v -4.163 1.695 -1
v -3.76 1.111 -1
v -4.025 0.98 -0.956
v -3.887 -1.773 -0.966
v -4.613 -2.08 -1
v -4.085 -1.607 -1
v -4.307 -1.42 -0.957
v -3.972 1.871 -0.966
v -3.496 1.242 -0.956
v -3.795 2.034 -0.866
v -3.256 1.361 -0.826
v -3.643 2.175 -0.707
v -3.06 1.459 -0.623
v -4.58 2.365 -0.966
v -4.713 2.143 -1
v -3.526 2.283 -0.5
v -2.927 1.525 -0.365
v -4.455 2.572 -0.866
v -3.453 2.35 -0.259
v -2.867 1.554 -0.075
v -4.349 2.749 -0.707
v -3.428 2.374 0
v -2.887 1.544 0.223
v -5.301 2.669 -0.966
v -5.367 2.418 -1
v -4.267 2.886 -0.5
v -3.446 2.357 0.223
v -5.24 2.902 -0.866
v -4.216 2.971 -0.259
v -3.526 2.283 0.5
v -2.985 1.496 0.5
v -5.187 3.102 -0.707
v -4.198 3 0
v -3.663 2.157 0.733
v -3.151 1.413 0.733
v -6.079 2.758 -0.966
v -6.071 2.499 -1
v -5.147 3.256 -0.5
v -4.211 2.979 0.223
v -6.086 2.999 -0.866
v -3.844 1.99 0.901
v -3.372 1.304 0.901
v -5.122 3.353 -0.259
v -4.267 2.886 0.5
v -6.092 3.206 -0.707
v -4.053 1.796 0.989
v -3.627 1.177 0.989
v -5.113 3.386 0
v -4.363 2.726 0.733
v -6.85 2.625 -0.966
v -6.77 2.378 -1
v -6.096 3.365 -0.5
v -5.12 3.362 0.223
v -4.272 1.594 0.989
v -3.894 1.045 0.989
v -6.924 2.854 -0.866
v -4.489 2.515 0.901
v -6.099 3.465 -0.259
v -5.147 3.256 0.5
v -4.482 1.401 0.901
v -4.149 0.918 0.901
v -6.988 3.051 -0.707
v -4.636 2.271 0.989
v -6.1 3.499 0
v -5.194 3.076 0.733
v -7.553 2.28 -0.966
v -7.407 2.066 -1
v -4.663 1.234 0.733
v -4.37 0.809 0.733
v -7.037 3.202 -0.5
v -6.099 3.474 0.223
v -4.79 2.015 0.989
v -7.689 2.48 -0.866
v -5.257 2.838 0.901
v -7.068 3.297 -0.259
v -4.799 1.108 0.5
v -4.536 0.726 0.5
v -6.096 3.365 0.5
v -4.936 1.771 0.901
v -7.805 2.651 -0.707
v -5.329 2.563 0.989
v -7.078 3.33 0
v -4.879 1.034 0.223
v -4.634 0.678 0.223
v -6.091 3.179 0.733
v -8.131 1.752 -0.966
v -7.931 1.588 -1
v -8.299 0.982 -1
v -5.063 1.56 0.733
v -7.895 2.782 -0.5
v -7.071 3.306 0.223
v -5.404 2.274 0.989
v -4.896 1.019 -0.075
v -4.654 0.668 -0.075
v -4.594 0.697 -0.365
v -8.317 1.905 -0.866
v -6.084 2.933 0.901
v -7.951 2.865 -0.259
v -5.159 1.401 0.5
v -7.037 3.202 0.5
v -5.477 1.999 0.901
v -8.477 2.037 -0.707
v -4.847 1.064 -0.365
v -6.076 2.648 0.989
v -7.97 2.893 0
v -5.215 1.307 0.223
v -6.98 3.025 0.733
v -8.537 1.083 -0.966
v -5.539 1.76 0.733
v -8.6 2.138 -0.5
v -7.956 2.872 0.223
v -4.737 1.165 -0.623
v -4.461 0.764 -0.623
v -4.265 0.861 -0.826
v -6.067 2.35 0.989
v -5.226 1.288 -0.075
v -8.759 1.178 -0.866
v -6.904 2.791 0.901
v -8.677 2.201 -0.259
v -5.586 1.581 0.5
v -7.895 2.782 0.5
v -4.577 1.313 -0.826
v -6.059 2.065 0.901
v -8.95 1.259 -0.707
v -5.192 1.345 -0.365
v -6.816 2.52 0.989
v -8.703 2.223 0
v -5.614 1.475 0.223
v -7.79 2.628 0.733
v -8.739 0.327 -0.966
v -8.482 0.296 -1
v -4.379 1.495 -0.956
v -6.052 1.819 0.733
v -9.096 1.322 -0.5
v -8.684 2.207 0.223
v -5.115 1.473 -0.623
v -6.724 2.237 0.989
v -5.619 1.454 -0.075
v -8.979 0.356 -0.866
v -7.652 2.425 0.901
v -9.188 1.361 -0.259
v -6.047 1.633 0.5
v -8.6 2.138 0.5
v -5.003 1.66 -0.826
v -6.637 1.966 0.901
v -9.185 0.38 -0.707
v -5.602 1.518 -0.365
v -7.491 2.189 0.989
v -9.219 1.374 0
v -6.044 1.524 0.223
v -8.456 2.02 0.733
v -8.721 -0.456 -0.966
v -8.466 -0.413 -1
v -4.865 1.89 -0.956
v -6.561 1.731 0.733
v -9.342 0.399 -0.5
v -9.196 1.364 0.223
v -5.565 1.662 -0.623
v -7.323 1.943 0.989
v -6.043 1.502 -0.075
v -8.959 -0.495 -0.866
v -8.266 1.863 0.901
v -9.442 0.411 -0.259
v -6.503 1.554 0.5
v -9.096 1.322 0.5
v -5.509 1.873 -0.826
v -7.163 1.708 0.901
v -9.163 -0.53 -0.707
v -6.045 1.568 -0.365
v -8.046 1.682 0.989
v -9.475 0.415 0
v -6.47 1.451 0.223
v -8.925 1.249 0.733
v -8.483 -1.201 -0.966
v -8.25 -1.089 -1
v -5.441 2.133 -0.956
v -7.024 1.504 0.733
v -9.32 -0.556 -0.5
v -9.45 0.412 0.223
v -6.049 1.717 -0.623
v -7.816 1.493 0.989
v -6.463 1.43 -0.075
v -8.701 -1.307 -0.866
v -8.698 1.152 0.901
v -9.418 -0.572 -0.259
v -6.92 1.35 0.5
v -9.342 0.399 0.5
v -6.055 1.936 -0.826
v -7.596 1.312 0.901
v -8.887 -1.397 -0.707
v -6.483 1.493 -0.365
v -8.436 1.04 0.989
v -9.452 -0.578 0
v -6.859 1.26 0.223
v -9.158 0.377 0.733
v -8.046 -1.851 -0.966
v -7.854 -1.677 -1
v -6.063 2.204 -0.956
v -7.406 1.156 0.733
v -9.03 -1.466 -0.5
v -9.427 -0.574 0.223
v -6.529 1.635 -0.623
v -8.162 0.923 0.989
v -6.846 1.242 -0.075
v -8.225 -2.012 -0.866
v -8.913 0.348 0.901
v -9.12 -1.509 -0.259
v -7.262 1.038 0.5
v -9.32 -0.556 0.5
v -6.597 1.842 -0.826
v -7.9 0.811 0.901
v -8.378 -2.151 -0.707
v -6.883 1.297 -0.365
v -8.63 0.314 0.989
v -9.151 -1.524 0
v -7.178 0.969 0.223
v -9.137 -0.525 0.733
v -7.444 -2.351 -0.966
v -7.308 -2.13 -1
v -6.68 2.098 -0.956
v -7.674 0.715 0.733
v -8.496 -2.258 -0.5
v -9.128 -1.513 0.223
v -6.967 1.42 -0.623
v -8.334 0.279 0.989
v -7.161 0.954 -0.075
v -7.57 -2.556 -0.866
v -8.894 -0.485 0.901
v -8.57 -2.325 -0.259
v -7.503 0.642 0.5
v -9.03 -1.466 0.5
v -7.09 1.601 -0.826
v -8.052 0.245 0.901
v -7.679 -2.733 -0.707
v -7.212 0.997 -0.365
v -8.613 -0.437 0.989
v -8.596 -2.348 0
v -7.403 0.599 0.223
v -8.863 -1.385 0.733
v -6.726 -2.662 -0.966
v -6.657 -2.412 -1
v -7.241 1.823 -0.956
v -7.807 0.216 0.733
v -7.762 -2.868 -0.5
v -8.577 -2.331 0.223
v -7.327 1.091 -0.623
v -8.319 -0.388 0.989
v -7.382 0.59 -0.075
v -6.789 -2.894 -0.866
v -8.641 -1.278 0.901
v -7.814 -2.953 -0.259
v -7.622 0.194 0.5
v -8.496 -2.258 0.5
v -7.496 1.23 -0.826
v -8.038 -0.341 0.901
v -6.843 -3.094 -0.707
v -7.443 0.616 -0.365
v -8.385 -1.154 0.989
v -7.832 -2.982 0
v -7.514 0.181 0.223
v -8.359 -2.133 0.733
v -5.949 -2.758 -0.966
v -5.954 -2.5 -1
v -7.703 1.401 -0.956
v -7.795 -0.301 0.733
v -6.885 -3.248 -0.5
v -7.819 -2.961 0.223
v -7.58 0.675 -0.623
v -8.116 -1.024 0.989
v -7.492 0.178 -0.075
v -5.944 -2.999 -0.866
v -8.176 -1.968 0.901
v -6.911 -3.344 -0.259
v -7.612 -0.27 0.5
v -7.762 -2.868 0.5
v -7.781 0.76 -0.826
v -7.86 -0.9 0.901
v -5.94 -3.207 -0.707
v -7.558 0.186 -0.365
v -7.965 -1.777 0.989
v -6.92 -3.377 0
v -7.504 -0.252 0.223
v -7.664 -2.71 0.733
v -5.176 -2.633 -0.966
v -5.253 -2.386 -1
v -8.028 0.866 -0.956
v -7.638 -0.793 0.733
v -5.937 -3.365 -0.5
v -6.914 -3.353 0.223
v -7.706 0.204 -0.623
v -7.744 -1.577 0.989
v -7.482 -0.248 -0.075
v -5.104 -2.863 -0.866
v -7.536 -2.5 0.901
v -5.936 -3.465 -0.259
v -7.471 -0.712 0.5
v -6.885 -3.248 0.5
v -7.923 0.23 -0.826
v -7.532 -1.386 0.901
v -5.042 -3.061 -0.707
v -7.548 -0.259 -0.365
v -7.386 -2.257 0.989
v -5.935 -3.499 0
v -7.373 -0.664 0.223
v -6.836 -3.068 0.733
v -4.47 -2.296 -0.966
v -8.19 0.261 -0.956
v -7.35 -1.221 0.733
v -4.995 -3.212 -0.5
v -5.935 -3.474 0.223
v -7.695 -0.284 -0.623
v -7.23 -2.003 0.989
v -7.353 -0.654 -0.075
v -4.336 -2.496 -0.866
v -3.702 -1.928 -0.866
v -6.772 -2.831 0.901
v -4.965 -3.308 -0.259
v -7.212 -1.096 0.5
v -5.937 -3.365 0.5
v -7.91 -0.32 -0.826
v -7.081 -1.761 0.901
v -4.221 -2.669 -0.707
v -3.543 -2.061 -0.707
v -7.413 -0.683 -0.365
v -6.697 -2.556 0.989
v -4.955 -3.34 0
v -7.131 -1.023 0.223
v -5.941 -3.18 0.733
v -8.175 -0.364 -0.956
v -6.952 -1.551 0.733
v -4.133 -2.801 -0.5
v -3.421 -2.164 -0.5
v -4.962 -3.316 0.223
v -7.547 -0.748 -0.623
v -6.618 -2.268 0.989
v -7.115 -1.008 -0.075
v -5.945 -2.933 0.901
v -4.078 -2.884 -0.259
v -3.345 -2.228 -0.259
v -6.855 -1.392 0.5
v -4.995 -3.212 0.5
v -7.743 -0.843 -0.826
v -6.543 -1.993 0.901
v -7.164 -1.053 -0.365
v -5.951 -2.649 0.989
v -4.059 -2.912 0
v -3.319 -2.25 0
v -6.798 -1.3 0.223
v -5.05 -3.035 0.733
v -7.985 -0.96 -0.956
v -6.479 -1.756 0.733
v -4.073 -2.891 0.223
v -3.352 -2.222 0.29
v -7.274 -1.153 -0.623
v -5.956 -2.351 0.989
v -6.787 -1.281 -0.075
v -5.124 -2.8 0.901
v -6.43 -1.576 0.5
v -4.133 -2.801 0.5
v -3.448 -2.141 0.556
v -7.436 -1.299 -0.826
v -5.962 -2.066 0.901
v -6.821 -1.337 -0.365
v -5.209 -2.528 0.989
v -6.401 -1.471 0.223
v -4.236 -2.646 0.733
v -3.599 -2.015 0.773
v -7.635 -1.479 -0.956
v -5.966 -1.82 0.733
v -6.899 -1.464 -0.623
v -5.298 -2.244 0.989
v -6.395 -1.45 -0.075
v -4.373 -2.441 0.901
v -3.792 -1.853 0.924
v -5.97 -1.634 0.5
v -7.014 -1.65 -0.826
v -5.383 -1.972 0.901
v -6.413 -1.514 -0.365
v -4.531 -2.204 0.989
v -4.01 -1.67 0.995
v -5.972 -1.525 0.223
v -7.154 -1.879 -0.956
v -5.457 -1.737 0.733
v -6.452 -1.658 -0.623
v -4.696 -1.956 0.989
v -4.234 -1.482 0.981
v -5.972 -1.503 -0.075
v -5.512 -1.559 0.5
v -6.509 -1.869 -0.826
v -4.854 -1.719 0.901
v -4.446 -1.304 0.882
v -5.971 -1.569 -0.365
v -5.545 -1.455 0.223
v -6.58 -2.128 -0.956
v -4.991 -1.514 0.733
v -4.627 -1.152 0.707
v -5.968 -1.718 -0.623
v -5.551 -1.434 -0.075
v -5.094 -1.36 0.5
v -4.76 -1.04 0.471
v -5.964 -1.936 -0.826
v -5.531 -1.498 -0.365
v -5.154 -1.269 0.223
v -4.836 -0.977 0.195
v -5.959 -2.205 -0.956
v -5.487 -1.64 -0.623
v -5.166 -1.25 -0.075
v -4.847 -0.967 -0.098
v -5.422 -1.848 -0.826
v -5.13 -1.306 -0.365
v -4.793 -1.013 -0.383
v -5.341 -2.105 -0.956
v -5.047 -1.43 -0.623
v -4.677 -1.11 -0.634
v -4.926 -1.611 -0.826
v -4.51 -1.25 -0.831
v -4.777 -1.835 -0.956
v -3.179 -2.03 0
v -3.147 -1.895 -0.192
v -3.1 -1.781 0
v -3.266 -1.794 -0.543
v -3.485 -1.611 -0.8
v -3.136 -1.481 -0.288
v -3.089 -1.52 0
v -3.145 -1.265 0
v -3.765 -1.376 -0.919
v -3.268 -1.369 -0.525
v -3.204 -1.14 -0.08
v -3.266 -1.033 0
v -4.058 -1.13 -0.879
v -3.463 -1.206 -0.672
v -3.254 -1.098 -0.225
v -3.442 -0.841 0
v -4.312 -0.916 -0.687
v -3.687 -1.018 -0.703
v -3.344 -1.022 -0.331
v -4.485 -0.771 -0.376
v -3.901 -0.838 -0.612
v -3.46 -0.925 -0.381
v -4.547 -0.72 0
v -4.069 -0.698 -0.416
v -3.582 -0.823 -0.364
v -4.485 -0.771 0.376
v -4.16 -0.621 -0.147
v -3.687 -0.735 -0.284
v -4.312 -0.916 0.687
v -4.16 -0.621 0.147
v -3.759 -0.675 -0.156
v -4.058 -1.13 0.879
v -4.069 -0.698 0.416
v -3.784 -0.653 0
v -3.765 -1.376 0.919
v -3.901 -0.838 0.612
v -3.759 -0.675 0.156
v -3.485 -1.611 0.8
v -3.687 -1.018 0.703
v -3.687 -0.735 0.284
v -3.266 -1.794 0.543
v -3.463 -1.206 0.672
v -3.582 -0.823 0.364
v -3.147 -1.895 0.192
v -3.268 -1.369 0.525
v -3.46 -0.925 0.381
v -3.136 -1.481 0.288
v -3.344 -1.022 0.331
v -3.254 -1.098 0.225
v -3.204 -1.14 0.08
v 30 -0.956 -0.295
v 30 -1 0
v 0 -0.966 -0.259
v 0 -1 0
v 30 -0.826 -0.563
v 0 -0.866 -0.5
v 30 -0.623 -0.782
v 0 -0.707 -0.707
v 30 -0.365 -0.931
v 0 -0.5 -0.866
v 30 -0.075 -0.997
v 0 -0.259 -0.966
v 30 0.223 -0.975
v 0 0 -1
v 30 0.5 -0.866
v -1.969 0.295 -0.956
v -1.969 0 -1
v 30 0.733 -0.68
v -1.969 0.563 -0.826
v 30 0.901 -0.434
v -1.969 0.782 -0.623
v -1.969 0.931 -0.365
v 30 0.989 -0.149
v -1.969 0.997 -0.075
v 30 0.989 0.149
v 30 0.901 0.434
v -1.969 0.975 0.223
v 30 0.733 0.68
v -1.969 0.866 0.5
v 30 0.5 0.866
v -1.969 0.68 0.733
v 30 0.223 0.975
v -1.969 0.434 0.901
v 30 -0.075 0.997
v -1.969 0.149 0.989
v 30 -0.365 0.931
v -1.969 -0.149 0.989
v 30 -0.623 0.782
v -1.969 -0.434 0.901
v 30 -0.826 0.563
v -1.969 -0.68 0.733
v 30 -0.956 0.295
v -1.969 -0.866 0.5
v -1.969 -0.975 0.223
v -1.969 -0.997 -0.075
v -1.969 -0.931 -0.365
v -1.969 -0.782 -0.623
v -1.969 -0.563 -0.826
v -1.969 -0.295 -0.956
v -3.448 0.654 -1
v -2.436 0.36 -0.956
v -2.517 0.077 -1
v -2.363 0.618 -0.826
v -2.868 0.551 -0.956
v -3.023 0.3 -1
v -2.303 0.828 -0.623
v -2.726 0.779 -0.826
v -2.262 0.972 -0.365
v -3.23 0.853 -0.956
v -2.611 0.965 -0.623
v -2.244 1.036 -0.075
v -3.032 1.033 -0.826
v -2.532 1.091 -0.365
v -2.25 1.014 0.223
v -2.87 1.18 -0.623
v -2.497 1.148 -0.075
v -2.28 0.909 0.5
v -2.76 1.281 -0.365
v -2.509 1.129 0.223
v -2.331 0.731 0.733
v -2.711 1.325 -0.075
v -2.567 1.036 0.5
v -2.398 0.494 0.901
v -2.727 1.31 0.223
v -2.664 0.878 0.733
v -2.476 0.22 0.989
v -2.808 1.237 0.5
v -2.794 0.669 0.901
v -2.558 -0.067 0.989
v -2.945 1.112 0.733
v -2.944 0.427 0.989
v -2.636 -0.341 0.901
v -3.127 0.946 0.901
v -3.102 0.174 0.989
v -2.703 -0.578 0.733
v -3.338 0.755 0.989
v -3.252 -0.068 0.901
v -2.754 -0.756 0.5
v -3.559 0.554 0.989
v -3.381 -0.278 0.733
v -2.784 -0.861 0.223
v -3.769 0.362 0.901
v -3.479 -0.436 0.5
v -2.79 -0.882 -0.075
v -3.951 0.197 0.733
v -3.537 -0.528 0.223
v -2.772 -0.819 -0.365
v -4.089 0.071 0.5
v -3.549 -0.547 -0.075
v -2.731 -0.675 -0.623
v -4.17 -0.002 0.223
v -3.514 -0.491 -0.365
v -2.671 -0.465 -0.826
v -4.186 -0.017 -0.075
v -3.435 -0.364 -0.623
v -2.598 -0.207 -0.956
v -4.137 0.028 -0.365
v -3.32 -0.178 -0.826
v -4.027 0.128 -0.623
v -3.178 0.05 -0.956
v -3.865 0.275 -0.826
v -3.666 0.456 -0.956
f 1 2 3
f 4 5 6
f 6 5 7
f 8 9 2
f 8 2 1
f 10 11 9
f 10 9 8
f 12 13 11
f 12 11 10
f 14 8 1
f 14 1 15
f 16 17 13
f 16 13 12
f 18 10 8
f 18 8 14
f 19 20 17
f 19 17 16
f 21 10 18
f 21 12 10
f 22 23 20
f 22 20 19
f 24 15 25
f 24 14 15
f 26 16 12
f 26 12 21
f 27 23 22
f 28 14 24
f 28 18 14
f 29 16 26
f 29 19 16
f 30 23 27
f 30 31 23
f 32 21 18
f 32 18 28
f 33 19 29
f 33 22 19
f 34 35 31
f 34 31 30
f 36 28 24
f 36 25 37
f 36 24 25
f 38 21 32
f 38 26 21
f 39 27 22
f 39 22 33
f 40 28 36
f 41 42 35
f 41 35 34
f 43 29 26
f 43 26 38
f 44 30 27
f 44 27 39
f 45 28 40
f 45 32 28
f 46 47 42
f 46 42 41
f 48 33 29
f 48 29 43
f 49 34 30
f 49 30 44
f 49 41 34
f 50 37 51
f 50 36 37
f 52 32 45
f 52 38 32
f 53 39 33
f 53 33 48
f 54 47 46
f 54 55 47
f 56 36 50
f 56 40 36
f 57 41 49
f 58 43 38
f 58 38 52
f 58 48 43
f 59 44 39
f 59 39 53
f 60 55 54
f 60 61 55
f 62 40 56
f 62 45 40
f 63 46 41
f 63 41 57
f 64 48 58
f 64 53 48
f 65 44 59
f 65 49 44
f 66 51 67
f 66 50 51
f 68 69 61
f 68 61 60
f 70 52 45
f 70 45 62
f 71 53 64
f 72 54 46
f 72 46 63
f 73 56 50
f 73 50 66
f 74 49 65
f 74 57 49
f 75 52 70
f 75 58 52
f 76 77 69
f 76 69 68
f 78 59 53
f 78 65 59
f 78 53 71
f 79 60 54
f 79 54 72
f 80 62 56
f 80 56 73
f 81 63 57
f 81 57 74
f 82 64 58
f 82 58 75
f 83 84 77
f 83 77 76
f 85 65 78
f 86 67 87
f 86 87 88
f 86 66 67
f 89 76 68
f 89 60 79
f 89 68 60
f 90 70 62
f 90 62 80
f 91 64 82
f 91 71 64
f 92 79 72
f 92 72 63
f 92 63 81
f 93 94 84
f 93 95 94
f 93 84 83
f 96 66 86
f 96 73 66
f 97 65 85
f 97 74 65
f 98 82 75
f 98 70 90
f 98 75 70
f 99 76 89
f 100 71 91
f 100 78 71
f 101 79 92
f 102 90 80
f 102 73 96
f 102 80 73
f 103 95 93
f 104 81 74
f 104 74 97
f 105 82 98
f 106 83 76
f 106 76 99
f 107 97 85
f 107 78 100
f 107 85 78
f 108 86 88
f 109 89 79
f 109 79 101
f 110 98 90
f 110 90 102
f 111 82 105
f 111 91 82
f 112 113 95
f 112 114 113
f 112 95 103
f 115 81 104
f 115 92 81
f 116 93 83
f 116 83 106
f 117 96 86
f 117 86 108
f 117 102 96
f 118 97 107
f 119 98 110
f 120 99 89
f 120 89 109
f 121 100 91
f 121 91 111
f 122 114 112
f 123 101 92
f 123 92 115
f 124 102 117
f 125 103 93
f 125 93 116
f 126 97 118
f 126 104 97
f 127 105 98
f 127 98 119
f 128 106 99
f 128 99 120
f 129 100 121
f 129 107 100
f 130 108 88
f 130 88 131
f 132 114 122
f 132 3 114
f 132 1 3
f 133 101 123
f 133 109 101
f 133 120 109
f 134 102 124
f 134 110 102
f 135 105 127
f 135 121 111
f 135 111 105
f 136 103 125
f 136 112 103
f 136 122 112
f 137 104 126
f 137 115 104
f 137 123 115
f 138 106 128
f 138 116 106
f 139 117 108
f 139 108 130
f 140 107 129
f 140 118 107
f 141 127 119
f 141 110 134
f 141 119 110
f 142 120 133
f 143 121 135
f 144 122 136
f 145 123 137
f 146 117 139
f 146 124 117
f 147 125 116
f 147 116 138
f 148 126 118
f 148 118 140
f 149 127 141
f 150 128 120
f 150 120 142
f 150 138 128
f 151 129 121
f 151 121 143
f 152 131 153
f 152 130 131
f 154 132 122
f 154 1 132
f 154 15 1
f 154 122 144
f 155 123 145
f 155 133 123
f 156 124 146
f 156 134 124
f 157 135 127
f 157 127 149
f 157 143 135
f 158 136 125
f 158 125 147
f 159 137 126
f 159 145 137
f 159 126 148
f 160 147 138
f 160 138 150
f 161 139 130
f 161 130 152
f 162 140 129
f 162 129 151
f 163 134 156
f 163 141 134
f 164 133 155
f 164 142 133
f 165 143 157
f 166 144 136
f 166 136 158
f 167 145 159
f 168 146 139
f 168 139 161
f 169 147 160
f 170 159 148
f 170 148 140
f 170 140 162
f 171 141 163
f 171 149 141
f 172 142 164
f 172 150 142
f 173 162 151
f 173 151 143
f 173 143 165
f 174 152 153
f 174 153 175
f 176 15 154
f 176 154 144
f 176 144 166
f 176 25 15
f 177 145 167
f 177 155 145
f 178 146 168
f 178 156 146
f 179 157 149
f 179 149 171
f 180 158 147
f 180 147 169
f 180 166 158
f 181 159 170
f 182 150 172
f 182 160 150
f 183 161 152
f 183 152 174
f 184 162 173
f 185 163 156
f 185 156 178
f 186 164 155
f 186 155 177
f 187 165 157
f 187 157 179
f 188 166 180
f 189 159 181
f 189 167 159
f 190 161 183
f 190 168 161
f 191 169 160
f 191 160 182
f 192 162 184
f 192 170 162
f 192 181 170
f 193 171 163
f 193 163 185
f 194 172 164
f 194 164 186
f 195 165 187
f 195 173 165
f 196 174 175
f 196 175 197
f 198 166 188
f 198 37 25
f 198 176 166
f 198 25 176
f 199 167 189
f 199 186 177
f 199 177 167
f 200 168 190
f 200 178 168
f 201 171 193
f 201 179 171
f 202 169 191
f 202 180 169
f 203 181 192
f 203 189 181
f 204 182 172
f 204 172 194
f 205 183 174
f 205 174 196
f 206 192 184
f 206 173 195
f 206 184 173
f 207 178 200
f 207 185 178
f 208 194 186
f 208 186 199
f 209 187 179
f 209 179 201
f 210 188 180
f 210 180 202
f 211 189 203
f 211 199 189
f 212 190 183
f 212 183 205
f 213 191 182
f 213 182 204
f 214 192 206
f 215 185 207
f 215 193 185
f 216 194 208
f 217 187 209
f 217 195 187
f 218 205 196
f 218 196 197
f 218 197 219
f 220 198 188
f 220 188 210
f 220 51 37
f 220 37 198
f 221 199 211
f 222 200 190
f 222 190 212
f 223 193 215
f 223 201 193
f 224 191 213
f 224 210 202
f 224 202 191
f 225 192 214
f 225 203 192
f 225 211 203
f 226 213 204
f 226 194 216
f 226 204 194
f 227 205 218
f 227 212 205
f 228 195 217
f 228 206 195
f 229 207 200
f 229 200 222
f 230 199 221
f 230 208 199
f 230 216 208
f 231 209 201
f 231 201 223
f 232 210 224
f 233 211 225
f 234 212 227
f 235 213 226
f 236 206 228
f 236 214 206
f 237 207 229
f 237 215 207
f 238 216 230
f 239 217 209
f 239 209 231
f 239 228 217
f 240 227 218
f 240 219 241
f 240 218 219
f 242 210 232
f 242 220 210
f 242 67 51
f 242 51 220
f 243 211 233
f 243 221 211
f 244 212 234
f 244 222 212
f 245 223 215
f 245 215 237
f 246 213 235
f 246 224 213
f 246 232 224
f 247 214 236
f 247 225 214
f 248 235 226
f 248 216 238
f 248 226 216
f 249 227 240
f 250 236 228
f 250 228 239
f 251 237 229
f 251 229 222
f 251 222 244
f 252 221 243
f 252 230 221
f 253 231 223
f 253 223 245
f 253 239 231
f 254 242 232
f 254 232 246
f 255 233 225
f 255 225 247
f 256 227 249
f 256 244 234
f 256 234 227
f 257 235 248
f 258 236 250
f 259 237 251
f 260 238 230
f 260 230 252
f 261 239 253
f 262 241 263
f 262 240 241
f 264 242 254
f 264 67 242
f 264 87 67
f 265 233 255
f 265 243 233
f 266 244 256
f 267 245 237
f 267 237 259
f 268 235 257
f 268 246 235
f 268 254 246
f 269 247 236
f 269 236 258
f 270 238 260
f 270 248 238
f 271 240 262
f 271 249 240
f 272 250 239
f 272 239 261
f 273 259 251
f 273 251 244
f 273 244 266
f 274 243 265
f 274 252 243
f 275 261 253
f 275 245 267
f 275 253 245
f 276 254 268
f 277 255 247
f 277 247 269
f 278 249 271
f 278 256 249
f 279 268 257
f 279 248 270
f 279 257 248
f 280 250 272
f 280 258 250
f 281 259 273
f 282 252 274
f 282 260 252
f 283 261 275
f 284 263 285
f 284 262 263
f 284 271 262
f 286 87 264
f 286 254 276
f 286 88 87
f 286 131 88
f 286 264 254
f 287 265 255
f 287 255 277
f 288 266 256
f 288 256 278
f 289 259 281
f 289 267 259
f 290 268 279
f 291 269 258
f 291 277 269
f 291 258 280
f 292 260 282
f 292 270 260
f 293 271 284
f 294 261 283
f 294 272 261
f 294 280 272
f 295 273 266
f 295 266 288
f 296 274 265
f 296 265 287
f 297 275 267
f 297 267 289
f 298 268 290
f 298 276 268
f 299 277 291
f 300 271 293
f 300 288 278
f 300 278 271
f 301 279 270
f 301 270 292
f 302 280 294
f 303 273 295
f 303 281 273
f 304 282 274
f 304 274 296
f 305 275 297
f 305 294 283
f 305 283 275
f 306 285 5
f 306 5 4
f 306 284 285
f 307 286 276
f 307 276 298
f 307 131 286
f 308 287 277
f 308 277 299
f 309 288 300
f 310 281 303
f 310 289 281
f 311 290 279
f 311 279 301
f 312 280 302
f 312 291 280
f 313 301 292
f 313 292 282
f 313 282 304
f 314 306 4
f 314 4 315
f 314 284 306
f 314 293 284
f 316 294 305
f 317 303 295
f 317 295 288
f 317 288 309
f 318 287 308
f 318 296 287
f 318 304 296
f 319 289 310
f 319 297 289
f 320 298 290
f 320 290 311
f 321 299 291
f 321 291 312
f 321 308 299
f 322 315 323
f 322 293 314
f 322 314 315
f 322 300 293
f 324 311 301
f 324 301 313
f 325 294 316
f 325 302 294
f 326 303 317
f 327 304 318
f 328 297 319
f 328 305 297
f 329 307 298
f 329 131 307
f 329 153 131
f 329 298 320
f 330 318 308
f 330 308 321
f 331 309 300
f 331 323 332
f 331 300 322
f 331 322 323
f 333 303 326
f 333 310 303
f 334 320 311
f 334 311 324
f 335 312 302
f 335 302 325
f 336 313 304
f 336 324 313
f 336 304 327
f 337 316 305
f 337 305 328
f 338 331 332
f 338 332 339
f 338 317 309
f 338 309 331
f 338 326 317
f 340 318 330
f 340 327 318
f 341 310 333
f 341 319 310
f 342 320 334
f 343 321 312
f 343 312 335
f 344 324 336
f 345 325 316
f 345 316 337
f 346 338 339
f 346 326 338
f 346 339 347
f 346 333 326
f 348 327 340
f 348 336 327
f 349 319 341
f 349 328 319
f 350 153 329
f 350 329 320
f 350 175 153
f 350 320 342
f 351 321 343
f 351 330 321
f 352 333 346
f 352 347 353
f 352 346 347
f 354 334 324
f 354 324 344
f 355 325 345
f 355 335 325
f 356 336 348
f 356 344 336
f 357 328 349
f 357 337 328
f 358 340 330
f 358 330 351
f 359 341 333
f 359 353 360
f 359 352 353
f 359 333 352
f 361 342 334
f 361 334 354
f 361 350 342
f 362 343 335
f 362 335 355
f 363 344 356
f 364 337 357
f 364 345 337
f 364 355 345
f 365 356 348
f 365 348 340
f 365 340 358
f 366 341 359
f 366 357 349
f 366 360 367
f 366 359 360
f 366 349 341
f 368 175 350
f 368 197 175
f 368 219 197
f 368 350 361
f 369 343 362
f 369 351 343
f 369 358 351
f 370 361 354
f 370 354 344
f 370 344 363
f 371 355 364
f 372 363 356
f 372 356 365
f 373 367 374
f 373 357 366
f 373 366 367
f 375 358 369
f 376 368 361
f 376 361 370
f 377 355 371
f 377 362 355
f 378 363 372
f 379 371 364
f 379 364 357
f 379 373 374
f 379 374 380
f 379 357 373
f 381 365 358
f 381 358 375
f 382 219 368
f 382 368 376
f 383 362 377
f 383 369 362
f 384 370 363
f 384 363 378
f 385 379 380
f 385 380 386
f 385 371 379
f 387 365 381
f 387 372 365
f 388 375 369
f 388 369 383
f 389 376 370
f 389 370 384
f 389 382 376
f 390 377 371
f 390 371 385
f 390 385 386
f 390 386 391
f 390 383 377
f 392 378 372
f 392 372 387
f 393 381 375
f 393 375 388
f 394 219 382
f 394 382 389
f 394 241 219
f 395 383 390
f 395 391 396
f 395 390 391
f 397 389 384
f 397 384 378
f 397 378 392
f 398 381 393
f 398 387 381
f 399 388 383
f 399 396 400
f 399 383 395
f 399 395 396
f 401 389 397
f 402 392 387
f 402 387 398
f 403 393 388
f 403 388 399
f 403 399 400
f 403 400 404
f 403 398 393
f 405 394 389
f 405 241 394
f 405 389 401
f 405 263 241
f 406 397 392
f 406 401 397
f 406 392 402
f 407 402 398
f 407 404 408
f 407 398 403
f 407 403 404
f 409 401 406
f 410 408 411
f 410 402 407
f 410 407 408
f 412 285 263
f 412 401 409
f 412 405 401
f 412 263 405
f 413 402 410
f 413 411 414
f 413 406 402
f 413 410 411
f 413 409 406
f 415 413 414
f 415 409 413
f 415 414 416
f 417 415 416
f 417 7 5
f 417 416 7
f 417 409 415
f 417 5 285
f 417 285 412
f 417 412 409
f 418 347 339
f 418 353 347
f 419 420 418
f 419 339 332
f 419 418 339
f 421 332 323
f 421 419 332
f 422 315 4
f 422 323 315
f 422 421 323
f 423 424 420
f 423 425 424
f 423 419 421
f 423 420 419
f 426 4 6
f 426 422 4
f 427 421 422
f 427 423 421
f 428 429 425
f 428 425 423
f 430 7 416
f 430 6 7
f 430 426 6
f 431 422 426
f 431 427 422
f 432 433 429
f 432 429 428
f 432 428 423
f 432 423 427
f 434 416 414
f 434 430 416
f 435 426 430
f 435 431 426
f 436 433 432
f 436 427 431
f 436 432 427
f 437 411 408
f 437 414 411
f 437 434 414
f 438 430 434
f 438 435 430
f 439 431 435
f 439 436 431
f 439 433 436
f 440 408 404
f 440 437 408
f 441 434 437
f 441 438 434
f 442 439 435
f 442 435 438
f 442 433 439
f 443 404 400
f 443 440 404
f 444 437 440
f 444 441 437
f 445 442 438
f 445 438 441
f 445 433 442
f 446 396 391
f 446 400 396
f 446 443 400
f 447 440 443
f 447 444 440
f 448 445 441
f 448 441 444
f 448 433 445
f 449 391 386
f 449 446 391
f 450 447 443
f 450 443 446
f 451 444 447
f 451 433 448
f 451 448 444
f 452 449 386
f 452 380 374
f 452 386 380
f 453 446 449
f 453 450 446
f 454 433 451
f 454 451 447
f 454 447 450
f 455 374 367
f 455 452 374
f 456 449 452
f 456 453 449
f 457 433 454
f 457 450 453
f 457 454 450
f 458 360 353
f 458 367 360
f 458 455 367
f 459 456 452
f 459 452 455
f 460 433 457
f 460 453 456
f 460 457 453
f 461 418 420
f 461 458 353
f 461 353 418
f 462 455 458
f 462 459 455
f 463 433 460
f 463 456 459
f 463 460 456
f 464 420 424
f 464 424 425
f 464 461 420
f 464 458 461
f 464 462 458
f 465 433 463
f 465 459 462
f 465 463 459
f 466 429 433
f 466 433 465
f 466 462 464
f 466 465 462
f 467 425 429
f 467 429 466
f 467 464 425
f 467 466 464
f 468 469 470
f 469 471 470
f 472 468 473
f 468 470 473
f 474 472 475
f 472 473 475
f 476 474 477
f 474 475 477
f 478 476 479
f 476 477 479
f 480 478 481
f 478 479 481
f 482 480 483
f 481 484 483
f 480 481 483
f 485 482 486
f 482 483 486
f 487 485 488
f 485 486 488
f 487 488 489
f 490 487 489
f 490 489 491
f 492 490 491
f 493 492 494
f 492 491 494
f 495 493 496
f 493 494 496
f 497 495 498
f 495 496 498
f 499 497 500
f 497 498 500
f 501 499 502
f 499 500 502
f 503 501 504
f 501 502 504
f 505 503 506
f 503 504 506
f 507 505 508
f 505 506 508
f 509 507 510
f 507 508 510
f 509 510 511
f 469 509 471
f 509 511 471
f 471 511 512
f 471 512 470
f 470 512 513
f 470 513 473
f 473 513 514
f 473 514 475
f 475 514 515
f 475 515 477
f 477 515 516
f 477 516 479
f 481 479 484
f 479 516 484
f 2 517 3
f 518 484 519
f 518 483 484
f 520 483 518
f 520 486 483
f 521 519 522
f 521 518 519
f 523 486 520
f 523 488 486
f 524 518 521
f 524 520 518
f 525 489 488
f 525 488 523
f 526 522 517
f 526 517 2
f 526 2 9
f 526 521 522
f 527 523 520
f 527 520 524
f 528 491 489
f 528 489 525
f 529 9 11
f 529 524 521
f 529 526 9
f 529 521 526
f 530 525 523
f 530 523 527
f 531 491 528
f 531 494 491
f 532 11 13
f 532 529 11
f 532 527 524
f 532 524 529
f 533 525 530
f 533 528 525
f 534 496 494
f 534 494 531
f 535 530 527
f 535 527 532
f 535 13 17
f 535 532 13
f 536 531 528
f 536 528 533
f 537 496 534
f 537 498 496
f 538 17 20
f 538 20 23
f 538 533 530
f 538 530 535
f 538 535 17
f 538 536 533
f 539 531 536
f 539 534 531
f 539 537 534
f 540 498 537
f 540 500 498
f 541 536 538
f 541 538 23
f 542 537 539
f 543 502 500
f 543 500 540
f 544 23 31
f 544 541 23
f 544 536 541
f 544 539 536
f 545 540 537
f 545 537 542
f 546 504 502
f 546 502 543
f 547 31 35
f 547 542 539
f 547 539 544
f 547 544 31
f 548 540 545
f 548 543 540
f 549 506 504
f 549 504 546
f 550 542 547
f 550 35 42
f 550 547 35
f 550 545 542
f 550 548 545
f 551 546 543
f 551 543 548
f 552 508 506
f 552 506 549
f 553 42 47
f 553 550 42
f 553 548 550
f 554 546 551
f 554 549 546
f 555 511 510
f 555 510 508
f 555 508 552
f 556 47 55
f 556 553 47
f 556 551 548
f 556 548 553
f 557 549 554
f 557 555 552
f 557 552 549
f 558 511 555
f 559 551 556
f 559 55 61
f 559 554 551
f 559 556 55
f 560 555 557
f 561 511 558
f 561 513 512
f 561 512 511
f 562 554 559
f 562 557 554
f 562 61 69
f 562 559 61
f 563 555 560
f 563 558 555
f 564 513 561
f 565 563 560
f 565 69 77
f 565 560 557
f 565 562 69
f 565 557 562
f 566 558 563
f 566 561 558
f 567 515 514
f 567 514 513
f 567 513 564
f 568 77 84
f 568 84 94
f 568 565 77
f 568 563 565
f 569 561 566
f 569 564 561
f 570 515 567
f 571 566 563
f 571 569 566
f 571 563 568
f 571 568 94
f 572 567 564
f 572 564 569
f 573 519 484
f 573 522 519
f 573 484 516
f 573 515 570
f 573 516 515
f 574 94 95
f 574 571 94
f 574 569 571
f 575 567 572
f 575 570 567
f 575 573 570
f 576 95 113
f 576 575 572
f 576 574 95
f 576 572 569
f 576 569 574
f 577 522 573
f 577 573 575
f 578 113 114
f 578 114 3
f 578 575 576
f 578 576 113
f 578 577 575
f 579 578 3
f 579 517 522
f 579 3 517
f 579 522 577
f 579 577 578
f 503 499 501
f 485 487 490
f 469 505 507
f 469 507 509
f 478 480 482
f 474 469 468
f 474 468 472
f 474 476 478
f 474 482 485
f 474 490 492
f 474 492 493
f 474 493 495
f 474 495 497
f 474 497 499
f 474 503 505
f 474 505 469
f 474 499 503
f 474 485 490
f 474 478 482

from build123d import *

# Parameters (mm, degrees)
SKETCH2_R           = 1
SKETCH3_R           = 1
BOSS_EXTRUDE1_DEPTH = 30
DOME1_FACE_RADIUS   = 1
DOME1_HEIGHT        = 1


with BuildPart() as part:
    # Sweep1: sweep along a path in Sketch1
    with BuildLine(Plane.XY) as sweep1_path:
        Line((0, 0), (-1.968871126, 0))
        ThreePointArc((-1.968871126, 0), (-3.022963679, 0.300326829), (-3.760483959, 1.111111111))
        ThreePointArc((-3.760483959, 1.111111111), (-8.482382241, 0.29627421), (-4.084888892, -1.606969024))
    # Sketch2 → Sweep1 (sweep)
    with BuildSketch(Plane(origin=(0, 0, 0), x_dir=(0, 0, -1), z_dir=(1, 0, 0))):
        Circle(SKETCH2_R)
    sweep(path=sweep1_path.line)

    # Sketch3 → Boss-Extrude1 (add)
    with BuildSketch(Plane(origin=(0, 0, 0), x_dir=(0, 0, -1), z_dir=(1, 0, 0))):
        with Locations(Location((0, 0, 0), (0, 0, 270))):
            Circle(SKETCH3_R)
    extrude(amount=BOSS_EXTRUDE1_DEPTH)

    # Dome1: a dome of height H over a round flat face of radius A is a cap of a sphere of radius (A * A + H * H) / (2 * H)
    dome1_r = (DOME1_FACE_RADIUS * DOME1_FACE_RADIUS + DOME1_HEIGHT * DOME1_HEIGHT) / (2 * DOME1_HEIGHT)
    dome1_base = Plane((-4.084888892, -1.606969024, 0), z_dir=(0.642787609687, 0.766044443119, 0))
    with Locations(dome1_base.offset(DOME1_HEIGHT - dome1_r)):
        dome1_ball = Sphere(dome1_r, mode=Mode.PRIVATE)
    add(split(dome1_ball, bisect_by=dome1_base, keep=Keep.TOP, mode=Mode.PRIVATE))


solid = part.part
